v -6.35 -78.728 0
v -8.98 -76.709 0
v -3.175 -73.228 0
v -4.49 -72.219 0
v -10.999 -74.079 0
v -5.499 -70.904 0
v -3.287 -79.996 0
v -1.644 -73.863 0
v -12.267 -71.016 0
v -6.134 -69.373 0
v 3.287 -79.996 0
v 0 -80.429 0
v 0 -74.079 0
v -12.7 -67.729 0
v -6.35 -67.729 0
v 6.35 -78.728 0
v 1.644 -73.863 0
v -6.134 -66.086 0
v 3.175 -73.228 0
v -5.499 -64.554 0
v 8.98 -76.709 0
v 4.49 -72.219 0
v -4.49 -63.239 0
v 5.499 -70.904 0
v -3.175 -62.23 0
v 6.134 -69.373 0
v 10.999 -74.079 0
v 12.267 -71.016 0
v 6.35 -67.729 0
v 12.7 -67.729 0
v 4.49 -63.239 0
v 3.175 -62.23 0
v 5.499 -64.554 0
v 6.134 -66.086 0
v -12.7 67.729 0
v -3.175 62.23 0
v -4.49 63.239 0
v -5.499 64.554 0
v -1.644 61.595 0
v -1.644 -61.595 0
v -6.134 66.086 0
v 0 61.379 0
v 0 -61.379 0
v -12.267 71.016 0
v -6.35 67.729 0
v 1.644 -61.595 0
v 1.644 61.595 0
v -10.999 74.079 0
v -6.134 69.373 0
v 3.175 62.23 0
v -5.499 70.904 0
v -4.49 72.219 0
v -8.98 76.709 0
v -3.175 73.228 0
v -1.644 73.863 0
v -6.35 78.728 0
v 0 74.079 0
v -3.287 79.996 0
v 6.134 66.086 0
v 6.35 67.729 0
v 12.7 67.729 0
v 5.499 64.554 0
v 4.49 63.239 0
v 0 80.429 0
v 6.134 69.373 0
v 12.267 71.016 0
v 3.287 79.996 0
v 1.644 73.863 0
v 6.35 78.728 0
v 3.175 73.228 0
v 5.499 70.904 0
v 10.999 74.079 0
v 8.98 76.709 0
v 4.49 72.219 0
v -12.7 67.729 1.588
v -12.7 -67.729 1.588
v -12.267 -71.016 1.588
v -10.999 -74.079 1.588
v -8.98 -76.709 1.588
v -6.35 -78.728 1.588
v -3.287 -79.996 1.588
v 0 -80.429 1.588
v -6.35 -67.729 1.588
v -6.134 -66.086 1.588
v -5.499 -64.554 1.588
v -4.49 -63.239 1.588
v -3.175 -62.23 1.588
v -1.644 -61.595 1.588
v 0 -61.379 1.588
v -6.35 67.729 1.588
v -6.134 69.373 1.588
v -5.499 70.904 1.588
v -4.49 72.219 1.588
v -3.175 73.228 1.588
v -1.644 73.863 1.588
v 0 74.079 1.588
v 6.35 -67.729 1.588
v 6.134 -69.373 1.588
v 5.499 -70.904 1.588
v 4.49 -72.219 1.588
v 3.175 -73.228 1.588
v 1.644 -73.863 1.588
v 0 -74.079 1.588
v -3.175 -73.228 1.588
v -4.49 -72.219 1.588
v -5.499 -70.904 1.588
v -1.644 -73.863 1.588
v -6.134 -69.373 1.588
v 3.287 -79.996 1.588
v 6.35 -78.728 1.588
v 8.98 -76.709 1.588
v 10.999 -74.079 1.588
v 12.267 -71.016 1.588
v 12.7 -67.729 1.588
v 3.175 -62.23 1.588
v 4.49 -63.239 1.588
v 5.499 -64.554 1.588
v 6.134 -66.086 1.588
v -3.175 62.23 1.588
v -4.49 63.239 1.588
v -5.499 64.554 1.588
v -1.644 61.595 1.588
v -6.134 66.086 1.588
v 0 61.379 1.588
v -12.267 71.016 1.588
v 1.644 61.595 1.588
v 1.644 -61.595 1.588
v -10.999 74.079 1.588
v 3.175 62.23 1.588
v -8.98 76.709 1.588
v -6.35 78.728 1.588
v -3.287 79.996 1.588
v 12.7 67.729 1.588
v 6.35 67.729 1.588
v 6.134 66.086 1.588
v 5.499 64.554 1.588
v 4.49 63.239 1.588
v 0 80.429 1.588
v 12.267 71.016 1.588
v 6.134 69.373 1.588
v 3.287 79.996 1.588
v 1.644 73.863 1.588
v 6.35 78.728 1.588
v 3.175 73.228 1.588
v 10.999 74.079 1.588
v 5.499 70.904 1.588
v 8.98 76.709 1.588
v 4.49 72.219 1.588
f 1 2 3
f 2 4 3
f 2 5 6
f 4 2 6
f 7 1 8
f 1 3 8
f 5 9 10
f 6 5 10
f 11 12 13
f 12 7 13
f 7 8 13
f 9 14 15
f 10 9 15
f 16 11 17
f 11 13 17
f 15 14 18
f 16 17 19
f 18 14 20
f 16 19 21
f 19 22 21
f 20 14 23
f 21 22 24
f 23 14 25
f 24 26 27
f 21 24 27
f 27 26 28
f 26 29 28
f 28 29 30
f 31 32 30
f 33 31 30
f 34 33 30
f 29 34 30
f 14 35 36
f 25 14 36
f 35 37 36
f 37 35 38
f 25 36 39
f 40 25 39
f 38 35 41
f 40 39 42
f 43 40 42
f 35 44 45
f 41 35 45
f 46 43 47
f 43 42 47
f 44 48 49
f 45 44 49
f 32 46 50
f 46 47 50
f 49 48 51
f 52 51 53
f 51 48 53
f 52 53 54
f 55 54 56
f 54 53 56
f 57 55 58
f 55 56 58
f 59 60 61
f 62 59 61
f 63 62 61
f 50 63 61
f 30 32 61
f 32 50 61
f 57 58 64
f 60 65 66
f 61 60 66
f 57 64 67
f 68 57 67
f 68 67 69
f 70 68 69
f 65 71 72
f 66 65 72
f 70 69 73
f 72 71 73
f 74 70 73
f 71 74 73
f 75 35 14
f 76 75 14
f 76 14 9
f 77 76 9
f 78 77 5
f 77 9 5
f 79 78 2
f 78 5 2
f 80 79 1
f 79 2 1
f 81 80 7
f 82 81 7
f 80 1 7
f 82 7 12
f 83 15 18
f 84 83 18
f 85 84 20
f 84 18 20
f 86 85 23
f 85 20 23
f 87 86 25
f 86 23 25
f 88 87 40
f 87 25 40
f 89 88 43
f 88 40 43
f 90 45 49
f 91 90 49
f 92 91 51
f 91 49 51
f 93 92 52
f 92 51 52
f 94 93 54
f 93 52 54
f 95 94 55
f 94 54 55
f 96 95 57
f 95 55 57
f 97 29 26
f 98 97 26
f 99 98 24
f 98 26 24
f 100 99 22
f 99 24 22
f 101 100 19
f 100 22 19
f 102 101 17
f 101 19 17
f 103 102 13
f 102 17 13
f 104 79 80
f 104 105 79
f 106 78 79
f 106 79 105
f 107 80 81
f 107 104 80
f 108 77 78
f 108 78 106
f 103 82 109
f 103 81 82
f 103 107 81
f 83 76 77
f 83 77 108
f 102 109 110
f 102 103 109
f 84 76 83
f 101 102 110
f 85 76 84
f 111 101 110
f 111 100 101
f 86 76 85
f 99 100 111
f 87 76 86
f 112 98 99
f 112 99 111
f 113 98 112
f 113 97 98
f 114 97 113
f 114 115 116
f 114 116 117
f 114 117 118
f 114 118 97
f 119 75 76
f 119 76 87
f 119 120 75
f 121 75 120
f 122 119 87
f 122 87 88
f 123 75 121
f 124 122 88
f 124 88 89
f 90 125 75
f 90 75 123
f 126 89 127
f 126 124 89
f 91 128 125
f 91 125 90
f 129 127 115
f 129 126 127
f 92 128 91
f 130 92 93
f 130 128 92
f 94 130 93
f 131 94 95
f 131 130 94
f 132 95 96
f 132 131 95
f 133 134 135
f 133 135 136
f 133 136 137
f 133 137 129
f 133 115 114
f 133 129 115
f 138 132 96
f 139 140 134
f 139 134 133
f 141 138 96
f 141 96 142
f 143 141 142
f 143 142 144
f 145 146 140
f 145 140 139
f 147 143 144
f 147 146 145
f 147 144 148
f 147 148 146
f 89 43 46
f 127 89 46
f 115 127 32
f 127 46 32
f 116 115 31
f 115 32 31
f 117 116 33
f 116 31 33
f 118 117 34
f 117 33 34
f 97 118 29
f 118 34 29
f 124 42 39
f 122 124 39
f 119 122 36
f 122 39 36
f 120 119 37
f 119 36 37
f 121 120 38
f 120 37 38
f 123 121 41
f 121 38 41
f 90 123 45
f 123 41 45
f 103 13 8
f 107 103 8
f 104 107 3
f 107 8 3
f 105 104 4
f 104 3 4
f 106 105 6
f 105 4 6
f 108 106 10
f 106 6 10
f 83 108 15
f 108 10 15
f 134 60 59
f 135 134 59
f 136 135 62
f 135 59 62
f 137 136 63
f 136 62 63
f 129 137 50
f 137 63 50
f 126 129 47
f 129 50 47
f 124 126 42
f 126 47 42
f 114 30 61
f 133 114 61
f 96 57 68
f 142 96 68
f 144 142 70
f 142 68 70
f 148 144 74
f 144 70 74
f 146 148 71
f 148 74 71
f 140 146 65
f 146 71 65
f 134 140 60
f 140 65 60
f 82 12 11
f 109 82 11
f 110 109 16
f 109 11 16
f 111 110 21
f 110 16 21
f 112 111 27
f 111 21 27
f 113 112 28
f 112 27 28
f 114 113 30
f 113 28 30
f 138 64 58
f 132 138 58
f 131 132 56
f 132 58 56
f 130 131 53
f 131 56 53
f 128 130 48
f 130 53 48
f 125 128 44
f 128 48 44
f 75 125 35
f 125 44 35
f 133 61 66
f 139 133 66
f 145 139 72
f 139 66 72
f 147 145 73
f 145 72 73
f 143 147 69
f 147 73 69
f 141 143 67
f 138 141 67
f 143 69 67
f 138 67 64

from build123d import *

# Parameters (mm, degrees)
F1_DEPTH = 1.5875


with BuildPart() as f1:
    # F0 (on Top) → F1 (new body)
    with BuildSketch(Plane.XY):
        with BuildLine():
            ThreePointArc((0, 74.0791), (4.490128, 72.219228), (6.35, 67.7291))
            Line((6.35, 67.7291), (12.7, 67.7291))
            ThreePointArc((12.7, 67.7291), (8.980256, 76.709356), (0, 80.4291))
            Line((0, 80.4291), (0, 74.0791))
        make_face()
        with BuildLine():
            Line((12.7, 67.7291), (6.35, 67.7291))
            ThreePointArc((6.35, 67.7291), (4.490128, 63.238972), (0, 61.3791))
            Line((0, 61.3791), (0, -61.3791))
            ThreePointArc((0, -61.3791), (4.490128, -63.238972), (6.35, -67.7291))
            Line((6.35, -67.7291), (12.7, -67.7291))
            Line((12.7, -67.7291), (12.7, 67.7291))
        make_face()
        with BuildLine():
            ThreePointArc((-6.35, 67.7291), (-4.490128, 72.219228), (0, 74.0791))
            Line((0, 74.0791), (0, 80.4291))
            ThreePointArc((0, 80.4291), (-8.980256, 76.709356), (-12.7, 67.7291))
            Line((-12.7, 67.7291), (-6.35, 67.7291))
        make_face()
        with BuildLine():
            Line((0, -61.3791), (0, 61.3791))
            ThreePointArc((0, 61.3791), (-4.490128, 63.238972), (-6.35, 67.7291))
            Line((-6.35, 67.7291), (-12.7, 67.7291))
            Line((-12.7, 67.7291), (-12.7, -67.7291))
            Line((-12.7, -67.7291), (-6.35, -67.7291))
            ThreePointArc((-6.35, -67.7291), (-4.490128, -63.238972), (0, -61.3791))
        make_face()
        with BuildLine():
            ThreePointArc((0, -80.4291), (8.980256, -76.709356), (12.7, -67.7291))
            Line((12.7, -67.7291), (6.35, -67.7291))
            ThreePointArc((6.35, -67.7291), (4.490128, -72.219228), (0, -74.0791))
            Line((0, -74.0791), (0, -80.4291))
        make_face()
        with BuildLine():
            ThreePointArc((-12.7, -67.7291), (-8.980256, -76.709356), (0, -80.4291))
            Line((0, -80.4291), (0, -74.0791))
            ThreePointArc((0, -74.0791), (-4.490128, -72.219228), (-6.35, -67.7291))
            Line((-6.35, -67.7291), (-12.7, -67.7291))
        make_face()
    extrude(amount=F1_DEPTH)


solid = f1.part
